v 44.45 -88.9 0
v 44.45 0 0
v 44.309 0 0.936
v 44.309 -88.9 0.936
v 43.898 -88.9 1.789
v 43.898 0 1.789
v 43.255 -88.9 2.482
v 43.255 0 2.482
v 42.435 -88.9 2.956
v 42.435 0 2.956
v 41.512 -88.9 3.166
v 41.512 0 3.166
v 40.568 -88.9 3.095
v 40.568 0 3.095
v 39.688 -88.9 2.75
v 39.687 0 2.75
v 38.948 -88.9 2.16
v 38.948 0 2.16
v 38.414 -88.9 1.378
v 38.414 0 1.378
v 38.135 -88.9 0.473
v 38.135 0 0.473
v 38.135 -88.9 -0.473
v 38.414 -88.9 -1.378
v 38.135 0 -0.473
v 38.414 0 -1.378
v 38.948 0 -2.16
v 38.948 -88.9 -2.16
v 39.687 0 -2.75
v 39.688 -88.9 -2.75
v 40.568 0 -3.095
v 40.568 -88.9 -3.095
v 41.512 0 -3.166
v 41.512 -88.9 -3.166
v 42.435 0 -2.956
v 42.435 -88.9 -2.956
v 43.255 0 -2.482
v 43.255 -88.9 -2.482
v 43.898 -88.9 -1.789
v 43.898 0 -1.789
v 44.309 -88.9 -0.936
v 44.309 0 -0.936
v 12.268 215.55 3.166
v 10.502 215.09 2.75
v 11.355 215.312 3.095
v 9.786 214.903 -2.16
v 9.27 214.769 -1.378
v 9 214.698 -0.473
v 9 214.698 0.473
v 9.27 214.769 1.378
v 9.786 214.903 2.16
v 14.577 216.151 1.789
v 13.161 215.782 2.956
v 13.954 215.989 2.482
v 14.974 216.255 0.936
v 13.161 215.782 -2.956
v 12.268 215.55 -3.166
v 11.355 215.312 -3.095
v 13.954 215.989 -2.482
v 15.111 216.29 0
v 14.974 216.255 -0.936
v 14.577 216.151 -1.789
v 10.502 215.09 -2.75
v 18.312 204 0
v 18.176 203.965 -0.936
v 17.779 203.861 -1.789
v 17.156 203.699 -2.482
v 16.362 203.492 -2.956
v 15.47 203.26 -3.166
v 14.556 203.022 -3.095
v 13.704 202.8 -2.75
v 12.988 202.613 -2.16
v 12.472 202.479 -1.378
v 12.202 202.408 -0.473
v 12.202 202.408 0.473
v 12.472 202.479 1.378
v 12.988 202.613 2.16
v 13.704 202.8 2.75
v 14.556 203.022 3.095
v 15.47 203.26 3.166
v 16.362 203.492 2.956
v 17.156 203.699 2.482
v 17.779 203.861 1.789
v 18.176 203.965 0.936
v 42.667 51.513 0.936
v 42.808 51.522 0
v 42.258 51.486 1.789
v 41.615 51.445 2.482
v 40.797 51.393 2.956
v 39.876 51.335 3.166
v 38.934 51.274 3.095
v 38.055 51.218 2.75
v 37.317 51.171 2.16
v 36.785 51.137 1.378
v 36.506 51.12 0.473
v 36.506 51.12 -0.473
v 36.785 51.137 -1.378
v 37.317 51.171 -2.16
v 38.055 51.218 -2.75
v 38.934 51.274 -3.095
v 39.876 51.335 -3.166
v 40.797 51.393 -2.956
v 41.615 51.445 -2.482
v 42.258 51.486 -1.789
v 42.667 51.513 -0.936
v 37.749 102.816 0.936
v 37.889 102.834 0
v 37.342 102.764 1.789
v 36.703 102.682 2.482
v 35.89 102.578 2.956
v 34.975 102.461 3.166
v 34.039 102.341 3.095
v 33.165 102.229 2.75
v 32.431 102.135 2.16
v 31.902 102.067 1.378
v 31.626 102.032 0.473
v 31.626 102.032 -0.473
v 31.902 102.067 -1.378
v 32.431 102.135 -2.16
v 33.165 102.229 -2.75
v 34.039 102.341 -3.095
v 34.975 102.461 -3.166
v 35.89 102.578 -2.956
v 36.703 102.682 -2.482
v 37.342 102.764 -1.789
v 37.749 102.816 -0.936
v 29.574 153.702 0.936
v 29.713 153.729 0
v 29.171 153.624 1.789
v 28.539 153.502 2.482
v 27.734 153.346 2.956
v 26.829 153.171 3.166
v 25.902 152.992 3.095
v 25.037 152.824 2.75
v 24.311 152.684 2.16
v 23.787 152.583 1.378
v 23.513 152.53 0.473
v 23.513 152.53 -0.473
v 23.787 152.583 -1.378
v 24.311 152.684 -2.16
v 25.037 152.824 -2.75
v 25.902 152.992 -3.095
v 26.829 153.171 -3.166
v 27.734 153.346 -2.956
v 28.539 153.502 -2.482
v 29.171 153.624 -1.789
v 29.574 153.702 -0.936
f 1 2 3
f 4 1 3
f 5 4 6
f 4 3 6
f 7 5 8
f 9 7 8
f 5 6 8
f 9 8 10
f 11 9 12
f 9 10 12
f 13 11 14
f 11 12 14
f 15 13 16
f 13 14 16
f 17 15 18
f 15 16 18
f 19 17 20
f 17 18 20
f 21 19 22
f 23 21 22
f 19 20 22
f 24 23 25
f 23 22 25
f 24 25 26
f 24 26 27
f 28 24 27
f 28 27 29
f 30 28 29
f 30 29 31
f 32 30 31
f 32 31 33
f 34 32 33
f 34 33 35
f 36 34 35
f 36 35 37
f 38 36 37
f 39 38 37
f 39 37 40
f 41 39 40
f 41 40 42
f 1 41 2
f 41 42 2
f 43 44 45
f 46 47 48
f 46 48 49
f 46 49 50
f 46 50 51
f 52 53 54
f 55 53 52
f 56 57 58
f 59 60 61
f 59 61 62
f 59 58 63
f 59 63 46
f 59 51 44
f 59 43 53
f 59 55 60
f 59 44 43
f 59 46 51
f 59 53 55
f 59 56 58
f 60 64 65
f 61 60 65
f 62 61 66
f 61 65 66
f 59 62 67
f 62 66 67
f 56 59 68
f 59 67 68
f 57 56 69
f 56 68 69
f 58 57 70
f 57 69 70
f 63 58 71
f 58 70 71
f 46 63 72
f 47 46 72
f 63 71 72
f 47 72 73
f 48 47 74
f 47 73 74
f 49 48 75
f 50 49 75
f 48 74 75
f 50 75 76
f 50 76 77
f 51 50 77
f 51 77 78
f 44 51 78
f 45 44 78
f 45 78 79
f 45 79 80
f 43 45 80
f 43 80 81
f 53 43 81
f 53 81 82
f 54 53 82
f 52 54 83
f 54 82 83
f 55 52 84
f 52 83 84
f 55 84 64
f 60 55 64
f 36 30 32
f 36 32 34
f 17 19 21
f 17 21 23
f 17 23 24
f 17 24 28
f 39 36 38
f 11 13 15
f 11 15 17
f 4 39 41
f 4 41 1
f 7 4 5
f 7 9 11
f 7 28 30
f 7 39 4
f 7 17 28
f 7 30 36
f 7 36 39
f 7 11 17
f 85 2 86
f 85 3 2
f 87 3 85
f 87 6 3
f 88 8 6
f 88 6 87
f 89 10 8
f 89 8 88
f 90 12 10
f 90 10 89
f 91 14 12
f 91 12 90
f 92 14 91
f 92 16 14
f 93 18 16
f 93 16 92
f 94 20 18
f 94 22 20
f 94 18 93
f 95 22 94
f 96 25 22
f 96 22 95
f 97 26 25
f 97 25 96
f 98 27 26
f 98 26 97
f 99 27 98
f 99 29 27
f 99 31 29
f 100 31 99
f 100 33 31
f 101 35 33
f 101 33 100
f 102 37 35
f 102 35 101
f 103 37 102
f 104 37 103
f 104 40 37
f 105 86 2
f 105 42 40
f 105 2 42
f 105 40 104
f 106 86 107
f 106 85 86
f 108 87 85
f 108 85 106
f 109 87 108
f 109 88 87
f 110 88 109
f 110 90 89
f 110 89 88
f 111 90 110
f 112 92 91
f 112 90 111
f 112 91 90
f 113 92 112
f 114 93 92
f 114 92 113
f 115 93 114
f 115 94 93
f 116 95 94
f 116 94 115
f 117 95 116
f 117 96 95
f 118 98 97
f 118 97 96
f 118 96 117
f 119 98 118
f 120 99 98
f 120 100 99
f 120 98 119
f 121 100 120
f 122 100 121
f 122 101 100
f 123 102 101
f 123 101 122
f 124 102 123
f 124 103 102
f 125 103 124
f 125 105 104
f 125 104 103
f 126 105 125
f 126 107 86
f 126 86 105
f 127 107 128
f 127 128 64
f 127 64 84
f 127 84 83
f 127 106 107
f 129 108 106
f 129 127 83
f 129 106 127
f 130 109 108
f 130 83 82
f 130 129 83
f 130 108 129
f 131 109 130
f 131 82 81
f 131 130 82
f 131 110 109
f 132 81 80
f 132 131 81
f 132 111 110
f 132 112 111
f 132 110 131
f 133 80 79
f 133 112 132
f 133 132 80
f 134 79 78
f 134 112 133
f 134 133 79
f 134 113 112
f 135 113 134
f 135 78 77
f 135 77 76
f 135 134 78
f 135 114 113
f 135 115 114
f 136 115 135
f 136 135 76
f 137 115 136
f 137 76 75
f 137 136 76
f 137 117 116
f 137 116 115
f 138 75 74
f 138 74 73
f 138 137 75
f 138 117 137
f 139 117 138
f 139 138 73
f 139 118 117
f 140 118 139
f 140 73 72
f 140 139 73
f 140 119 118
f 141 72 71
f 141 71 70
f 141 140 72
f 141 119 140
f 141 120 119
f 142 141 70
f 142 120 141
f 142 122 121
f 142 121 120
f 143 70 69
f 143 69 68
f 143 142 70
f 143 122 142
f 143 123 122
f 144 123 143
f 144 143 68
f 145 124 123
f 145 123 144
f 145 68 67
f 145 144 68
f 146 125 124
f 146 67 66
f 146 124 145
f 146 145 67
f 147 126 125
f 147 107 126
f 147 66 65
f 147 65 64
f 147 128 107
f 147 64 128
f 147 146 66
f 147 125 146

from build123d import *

# Parameters (mm, degrees)
SKETCH2_R           = 3.175
SKETCH4_R           = 3.175
BOSS_EXTRUDE1_DEPTH = 12.7
SKETCH5_R           = 3.175
BOSS_EXTRUDE2_DEPTH = 88.9


with BuildPart() as part:
    # Sweep1: sweep along a path in Sketch1
    with BuildLine(Plane.XY) as sweep1_path:
        ThreePointArc((41.275, 0), (34.739755092, 102.430538934), (15.24, 203.2))
    # Sketch2 → Sweep1 (sweep)
    with BuildSketch(Plane(origin=(0, 0, 0), x_dir=(1, 0, 0), z_dir=(0, 1, 0))):
        with Locations((41.275, 0)):
            Circle(SKETCH2_R)
    sweep(path=sweep1_path.line)

    # Sketch4 → Boss-Extrude1 (add)
    with BuildSketch(Plane(origin=(-48.605579352, 186.566514737, 0), x_dir=(0.9676982350284877, 0.25211133636302385, 0), z_dir=(-0.25211133636302385, 0.9676982350284877, 0))):
        with Locations((65.976744651, 0)):
            Circle(SKETCH4_R)
    extrude(amount=BOSS_EXTRUDE1_DEPTH)

    # Sketch5 → Boss-Extrude2 (add)
    with BuildSketch(Plane.XZ):
        with Locations((41.275, 0)):
            Circle(SKETCH5_R)
    extrude(amount=BOSS_EXTRUDE2_DEPTH)


solid = part.part
